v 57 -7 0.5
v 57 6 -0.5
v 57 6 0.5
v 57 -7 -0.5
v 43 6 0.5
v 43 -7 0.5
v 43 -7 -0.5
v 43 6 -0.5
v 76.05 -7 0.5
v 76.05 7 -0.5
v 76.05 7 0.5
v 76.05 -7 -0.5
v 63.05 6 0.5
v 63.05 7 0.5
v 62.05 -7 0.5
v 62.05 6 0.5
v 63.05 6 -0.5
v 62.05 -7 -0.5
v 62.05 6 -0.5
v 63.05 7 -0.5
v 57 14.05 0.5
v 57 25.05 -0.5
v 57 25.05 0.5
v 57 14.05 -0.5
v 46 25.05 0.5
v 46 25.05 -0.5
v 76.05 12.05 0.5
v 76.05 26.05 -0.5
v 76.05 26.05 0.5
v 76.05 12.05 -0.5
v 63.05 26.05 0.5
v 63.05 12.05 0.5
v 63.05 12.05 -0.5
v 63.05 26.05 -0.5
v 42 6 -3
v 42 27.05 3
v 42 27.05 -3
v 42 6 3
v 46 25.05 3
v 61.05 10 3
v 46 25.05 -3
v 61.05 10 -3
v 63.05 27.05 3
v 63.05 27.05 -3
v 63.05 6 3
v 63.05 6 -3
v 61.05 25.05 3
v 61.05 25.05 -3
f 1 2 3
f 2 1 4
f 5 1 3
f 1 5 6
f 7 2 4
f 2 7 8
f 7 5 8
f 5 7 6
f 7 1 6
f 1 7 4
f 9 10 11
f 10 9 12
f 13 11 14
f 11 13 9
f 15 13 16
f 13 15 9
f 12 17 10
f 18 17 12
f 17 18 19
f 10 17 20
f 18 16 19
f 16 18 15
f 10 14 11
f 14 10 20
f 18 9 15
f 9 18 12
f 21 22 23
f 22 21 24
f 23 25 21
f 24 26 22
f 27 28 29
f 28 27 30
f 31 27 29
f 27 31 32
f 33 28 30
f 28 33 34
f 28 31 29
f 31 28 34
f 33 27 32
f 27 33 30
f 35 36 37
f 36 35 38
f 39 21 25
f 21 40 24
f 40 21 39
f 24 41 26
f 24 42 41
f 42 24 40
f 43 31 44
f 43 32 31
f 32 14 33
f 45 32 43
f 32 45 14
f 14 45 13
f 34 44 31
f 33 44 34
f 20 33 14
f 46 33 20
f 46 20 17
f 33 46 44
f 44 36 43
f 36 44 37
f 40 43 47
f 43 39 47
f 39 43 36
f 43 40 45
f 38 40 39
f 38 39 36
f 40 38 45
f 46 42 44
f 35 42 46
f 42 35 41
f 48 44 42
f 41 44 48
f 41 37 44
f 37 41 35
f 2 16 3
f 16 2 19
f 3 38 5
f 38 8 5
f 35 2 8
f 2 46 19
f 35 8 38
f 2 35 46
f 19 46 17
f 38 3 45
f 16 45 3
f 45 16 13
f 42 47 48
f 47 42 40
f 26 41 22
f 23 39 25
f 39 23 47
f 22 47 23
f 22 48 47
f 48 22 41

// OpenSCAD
union () {
  translate ([50.0, 0.0, 0]) {
    rotate (a=0.0, v=[0, 0, 1]) {
      rotate (a=0.0, v=[0, 0, 0]) {
        translate ([0, 0, 0]) {
          cube ([14, 14, 1], center=true);
        }
      }
    }
  }
  translate ([69.05, 0.0, 0]) {
    rotate (a=0.0, v=[0, 0, 1]) {
      rotate (a=0.0, v=[0, 0, 0]) {
        translate ([0, 0, 0]) {
          cube ([14, 14, 1], center=true);
        }
      }
    }
  }
  translate ([50.0, 19.05, 0]) {
    rotate (a=0.0, v=[0, 0, 1]) {
      rotate (a=0.0, v=[0, 0, 0]) {
        translate ([0, 0, 0]) {
          cube ([14, 14, 1], center=true);
        }
      }
    }
  }
  translate ([69.05, 19.05, 0]) {
    rotate (a=0.0, v=[0, 0, 1]) {
      rotate (a=0.0, v=[0, 0, 0]) {
        translate ([0, 0, 0]) {
          cube ([14, 14, 1], center=true);
        }
      }
    }
  }
  hull () {
    translate ([50.0, 0.0, 0]) {
      rotate (a=0.0, v=[0, 0, 1]) {
        rotate (a=0.0, v=[0, 0, 0]) {
          translate ([0, 0, 0]) {
            translate ([-7, 7, 0]) {
              cube ([2, 2, 6], center=true);
            }
          }
        }
      }
    }
    translate ([69.05, 0.0, 0]) {
      rotate (a=0.0, v=[0, 0, 1]) {
        rotate (a=0.0, v=[0, 0, 0]) {
          translate ([0, 0, 0]) {
            translate ([-7, 7, 0]) {
              cube ([2, 2, 6], center=true);
            }
          }
        }
      }
    }
    translate ([50.0, 19.05, 0]) {
      rotate (a=0.0, v=[0, 0, 1]) {
        rotate (a=0.0, v=[0, 0, 0]) {
          translate ([0, 0, 0]) {
            translate ([-7, 7, 0]) {
              cube ([2, 2, 6], center=true);
            }
          }
        }
      }
    }
  }
  hull () {
    translate ([69.05, 0.0, 0]) {
      rotate (a=0.0, v=[0, 0, 1]) {
        rotate (a=0.0, v=[0, 0, 0]) {
          translate ([0, 0, 0]) {
            translate ([-7, 7, 0]) {
              cube ([2, 2, 6], center=true);
            }
          }
        }
      }
    }
    translate ([69.05, 0.0, 0]) {
      rotate (a=0.0, v=[0, 0, 1]) {
        rotate (a=0.0, v=[0, 0, 0]) {
          translate ([0, 0, 0]) {
            translate ([-7, 7, 0]) {
              cube ([2, 2, 6], center=true);
            }
          }
        }
      }
    }
    translate ([69.05, 19.05, 0]) {
      rotate (a=0.0, v=[0, 0, 1]) {
        rotate (a=0.0, v=[0, 0, 0]) {
          translate ([0, 0, 0]) {
            translate ([-7, 7, 0]) {
              cube ([2, 2, 6], center=true);
            }
          }
        }
      }
    }
  }
  hull () {
    translate ([50.0, 19.05, 0]) {
      rotate (a=0.0, v=[0, 0, 1]) {
        rotate (a=0.0, v=[0, 0, 0]) {
          translate ([0, 0, 0]) {
            translate ([-7, 7, 0]) {
              cube ([2, 2, 6], center=true);
            }
          }
        }
      }
    }
    translate ([69.05, 19.05, 0]) {
      rotate (a=0.0, v=[0, 0, 1]) {
        rotate (a=0.0, v=[0, 0, 0]) {
          translate ([0, 0, 0]) {
            translate ([-7, 7, 0]) {
              cube ([2, 2, 6], center=true);
            }
          }
        }
      }
    }
    translate ([50.0, 19.05, 0]) {
      rotate (a=0.0, v=[0, 0, 1]) {
        rotate (a=0.0, v=[0, 0, 0]) {
          translate ([0, 0, 0]) {
            translate ([-7, 7, 0]) {
              cube ([2, 2, 6], center=true);
            }
          }
        }
      }
    }
  }
  hull () {
    translate ([69.05, 19.05, 0]) {
      rotate (a=0.0, v=[0, 0, 1]) {
        rotate (a=0.0, v=[0, 0, 0]) {
          translate ([0, 0, 0]) {
            translate ([-7, 7, 0]) {
              cube ([2, 2, 6], center=true);
            }
          }
        }
      }
    }
    translate ([69.05, 19.05, 0]) {
      rotate (a=0.0, v=[0, 0, 1]) {
        rotate (a=0.0, v=[0, 0, 0]) {
          translate ([0, 0, 0]) {
            translate ([-7, 7, 0]) {
              cube ([2, 2, 6], center=true);
            }
          }
        }
      }
    }
    translate ([69.05, 19.05, 0]) {
      rotate (a=0.0, v=[0, 0, 1]) {
        rotate (a=0.0, v=[0, 0, 0]) {
          translate ([0, 0, 0]) {
            translate ([-7, 7, 0]) {
              cube ([2, 2, 6], center=true);
            }
          }
        }
      }
    }
  }
}
